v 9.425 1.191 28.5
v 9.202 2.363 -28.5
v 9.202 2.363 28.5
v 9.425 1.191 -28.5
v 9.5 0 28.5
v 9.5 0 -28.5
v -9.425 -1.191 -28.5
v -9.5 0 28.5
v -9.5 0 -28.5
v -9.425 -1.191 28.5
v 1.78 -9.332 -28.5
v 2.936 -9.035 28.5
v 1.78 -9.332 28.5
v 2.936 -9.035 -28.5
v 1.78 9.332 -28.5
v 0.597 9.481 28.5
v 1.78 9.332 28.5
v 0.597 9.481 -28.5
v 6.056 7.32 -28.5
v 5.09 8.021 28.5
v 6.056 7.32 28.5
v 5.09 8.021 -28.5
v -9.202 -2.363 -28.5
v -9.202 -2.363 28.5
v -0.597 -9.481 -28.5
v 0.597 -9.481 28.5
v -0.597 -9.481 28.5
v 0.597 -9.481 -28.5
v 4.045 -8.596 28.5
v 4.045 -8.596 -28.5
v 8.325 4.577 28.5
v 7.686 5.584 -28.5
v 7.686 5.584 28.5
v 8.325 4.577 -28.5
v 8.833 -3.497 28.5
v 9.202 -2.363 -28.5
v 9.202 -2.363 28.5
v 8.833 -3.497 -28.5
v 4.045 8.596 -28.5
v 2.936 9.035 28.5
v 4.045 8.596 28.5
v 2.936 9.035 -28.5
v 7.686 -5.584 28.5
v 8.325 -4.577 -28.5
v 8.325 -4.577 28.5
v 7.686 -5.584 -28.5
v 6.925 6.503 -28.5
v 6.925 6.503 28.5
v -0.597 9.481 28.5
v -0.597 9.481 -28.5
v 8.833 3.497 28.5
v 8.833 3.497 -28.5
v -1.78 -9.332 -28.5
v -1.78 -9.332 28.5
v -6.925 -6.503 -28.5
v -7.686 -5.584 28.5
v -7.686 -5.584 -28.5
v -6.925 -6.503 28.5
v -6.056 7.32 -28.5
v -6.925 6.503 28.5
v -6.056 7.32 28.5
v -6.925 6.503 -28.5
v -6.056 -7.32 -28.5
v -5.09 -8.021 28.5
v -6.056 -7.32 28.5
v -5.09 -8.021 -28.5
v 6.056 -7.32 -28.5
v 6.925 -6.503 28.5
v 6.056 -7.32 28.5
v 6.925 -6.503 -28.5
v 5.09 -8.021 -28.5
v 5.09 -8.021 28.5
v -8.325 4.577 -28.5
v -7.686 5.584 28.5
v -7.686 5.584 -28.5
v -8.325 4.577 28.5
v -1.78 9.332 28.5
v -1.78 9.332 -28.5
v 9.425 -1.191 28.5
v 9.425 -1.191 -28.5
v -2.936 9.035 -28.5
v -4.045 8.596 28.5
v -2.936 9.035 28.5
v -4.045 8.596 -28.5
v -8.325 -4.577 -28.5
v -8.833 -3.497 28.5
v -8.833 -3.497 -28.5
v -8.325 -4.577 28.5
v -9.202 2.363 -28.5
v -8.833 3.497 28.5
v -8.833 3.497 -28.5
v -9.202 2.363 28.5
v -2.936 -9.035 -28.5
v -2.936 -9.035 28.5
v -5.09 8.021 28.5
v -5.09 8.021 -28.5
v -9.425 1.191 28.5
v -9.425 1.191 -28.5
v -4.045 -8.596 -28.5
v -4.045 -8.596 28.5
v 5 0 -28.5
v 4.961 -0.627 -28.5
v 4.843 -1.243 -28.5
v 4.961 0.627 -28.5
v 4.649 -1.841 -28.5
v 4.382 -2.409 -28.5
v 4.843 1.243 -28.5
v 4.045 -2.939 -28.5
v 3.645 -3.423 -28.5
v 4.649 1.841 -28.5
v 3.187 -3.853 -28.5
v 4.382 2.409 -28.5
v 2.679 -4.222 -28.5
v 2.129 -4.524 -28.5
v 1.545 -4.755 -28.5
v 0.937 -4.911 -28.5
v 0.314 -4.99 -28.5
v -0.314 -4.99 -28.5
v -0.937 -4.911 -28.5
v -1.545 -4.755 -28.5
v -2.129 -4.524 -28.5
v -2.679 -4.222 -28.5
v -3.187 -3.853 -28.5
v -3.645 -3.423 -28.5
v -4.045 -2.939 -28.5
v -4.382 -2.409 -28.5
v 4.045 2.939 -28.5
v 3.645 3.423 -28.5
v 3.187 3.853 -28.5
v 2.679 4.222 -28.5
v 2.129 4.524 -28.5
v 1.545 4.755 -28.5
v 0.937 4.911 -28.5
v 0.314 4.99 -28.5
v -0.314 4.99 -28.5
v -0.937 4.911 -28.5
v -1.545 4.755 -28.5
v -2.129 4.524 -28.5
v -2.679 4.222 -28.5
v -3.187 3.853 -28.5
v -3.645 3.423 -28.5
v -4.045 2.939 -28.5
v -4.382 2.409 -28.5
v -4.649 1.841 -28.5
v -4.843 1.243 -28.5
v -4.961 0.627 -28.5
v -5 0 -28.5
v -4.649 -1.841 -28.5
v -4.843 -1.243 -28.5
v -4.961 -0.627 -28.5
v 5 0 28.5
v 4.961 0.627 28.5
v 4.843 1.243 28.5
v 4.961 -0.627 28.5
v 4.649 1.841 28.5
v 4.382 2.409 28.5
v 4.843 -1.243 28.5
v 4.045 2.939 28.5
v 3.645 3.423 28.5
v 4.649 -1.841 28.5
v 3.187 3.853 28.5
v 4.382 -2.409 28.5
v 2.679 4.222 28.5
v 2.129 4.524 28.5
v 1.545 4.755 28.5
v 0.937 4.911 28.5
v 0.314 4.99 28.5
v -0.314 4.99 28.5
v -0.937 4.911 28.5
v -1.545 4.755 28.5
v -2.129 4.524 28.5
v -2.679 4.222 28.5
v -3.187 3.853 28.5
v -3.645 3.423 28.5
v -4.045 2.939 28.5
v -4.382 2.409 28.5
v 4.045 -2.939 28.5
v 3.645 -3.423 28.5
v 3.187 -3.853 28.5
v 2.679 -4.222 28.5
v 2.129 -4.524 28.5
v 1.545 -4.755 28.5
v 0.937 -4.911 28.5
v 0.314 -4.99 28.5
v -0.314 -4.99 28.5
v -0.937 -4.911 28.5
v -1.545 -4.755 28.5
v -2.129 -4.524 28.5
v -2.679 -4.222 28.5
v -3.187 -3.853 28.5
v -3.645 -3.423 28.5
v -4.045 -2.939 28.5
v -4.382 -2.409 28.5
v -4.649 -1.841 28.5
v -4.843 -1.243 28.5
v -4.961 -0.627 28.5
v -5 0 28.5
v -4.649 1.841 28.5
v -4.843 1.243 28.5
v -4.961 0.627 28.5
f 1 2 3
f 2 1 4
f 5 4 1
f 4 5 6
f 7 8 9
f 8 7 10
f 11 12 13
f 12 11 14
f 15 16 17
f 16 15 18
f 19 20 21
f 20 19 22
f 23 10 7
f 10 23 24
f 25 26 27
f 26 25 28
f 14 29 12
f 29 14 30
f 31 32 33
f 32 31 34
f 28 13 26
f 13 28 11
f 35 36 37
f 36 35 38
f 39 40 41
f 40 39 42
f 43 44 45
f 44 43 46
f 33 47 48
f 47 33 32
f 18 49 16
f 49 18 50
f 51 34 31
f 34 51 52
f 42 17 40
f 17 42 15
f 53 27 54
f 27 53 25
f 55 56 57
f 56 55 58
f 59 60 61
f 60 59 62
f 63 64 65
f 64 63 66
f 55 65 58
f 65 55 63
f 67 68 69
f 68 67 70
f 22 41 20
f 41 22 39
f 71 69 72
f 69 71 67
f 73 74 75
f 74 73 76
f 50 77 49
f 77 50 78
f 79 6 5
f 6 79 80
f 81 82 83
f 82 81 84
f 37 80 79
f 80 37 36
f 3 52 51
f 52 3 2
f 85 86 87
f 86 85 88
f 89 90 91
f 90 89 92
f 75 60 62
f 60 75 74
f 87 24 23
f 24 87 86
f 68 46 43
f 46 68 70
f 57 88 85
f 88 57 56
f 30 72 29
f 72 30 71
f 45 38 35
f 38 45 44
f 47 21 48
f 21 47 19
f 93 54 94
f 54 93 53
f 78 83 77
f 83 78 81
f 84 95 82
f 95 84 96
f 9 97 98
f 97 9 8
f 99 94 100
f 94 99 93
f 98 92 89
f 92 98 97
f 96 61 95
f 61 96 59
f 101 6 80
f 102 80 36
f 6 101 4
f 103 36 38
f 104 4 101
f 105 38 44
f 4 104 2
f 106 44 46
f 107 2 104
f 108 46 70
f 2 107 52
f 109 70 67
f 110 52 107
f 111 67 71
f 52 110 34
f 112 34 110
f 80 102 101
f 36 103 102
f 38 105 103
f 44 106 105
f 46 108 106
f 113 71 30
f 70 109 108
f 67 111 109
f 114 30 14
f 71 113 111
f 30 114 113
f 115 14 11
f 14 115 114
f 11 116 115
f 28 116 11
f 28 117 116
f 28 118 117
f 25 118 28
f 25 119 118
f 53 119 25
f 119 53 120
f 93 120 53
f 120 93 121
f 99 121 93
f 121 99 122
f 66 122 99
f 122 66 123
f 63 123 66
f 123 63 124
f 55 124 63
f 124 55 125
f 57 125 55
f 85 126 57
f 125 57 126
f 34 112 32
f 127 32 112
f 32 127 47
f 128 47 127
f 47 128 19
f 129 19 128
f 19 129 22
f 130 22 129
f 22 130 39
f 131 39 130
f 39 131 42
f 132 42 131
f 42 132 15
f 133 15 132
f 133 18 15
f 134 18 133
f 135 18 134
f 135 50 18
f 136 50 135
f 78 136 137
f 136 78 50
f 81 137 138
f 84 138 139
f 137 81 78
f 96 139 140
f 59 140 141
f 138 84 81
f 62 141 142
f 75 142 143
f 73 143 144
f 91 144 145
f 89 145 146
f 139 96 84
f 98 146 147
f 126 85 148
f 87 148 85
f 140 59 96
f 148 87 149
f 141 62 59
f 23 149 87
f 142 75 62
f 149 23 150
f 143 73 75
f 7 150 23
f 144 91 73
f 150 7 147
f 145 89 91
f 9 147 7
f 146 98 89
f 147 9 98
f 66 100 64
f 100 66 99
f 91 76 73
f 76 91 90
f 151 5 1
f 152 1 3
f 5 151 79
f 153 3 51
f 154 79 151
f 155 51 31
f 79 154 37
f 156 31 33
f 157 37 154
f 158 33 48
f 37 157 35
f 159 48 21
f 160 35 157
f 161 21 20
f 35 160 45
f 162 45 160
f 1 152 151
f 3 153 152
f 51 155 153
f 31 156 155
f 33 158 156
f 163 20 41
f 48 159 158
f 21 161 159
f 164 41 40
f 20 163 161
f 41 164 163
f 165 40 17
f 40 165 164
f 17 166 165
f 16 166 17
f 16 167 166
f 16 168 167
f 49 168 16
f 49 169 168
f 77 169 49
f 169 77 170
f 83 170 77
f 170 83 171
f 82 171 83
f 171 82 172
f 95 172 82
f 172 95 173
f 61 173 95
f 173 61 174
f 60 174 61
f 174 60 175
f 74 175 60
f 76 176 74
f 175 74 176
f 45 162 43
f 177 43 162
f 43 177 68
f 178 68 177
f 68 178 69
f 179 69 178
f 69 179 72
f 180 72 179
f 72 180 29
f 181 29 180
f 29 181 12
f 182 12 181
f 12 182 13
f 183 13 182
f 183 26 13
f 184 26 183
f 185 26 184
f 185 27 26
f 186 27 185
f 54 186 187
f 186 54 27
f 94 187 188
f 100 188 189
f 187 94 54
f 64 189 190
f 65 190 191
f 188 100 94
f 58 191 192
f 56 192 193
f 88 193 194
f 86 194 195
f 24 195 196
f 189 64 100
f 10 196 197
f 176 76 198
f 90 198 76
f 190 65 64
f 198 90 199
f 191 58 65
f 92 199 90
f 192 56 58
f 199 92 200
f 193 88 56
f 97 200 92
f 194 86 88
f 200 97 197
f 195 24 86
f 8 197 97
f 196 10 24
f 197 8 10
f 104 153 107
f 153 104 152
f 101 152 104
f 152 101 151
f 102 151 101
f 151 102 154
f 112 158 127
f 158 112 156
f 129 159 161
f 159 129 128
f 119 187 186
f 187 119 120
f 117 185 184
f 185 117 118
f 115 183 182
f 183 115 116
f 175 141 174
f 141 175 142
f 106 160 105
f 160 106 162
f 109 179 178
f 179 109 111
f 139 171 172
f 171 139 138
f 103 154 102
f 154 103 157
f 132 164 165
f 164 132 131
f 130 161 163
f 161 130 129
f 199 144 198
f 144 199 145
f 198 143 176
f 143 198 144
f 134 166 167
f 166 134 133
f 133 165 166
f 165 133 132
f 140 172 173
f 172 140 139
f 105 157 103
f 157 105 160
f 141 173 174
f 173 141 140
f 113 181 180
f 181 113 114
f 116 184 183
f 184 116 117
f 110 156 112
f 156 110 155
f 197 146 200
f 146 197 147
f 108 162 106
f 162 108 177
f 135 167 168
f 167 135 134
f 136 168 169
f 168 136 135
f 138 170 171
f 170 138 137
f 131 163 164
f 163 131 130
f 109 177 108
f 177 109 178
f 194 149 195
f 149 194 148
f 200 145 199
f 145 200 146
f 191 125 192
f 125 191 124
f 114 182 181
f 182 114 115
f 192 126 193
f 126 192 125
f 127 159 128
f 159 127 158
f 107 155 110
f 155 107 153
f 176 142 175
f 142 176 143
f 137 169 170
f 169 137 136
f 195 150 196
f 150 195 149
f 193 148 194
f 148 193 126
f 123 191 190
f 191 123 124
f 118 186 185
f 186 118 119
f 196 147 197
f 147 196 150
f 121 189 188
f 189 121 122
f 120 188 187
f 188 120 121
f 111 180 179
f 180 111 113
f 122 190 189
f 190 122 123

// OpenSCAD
$fn = 50;


difference() {
	union() {
		translate(v = [0, 0, -28.5000000000]) {
			cylinder(h = 57, r = 9.5000000000);
		}
	}
	union() {
		translate(v = [0, 0, -100.0000000000]) {
			cylinder(h = 200, r = 5.0000000000);
		}
	}
}
